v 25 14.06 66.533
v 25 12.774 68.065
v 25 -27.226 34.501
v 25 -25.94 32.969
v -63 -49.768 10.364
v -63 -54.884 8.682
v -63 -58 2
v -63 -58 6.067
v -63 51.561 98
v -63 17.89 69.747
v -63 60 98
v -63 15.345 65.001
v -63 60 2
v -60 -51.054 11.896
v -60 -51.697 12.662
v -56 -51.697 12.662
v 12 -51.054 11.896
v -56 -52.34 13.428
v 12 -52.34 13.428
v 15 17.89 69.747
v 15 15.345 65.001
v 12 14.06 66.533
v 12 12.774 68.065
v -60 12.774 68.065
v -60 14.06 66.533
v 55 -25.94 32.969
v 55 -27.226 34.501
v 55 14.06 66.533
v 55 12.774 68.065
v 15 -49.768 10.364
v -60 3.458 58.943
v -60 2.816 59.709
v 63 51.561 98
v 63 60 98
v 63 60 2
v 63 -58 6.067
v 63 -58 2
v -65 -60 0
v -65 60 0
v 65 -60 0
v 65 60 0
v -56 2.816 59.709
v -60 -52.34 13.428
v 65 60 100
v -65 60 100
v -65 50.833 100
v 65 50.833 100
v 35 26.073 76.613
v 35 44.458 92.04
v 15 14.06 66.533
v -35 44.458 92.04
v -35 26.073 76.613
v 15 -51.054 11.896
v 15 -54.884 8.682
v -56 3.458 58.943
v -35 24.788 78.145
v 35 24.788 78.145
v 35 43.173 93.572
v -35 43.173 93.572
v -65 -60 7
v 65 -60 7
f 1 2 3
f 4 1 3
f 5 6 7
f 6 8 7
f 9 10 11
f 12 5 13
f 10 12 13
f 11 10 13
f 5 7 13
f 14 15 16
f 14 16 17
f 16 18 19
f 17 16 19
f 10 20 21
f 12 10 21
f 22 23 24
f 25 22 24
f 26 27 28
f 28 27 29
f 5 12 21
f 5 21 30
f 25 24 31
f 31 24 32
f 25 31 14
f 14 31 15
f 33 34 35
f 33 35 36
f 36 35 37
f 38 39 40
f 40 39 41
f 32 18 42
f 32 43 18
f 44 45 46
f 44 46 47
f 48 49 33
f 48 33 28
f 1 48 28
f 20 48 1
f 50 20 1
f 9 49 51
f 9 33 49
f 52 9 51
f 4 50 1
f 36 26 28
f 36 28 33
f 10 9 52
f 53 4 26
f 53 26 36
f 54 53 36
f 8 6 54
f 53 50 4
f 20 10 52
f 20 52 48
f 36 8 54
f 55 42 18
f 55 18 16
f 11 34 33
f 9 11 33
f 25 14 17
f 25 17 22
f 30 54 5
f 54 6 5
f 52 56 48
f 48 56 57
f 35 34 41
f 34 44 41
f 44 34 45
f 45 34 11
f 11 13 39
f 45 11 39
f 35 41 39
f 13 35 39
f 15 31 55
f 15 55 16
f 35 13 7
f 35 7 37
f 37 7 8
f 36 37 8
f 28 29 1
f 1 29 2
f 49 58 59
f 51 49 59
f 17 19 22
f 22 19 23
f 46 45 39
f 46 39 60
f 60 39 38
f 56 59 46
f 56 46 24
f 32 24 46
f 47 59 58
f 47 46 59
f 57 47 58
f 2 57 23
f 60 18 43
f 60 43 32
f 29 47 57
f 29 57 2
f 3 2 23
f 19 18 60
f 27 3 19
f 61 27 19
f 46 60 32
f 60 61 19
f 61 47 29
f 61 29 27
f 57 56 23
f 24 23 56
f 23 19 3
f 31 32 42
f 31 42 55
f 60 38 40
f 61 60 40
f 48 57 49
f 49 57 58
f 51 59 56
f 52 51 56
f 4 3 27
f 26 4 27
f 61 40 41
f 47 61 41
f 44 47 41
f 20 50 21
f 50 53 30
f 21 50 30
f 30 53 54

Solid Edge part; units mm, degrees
sketch "Sketch1" plane through (0, 0, 0) normal (0, 0, 1) x (1, 0, 0)
  line L0 (-65, -60) -> (65, -60)
  line L1 (65, -60) -> (65, 60)
  line L2 (65, 60) -> (-65, 60)
  line L3 (-65, 60) -> (-65, -60)
extrude "Protrusion1" add sketch "Sketch1" along normal blind 2
sketch "Sketch2" plane through (0, 0, 2) normal (0, 0, 1) x (1, 0, 0)
  line L0 (-65, -60) -> (-63, -60)
  line L1 (-63, -60) -> (-63, 60)
  line L2 (-63, 60) -> (-65, 60)
  line L3 (-65, 60) -> (-65, -60)
  line L4 (65, 60) -> (63, 60)
  line L5 (63, 60) -> (63, -60)
  line L6 (63, -60) -> (65, -60)
  line L7 (65, -60) -> (65, 60)
extrude "Protrusion2" add sketch "Sketch2" along normal blind 98
sketch "Sketch3" plane through (65, 0, 51) normal (1, 0, 0) x (0, 1, 0)
  line L0 (-60, 49) -> (-60, -44)
  line L1 (50.8331, 49) -> (-60, -44)
  line L2 (50.8331, 49) -> (-60, 49)
extrude "ExtrudedCutout_1" cut sketch "Sketch3" against normal blind 130
sketch "Sketch4" plane through (-63, 0, 52) normal (1, 0, 0) x (0, 1, 0)
  line L0 (-60, -45) -> (-60, -50)
  line L1 (-60, -50) -> (-58, -50)
  line L2 (-58, -50) -> (-58, -45.9326)
  line L3 (51.561, 46) -> (-58, -45.9326)
  line L4 (60, 46) -> (51.561, 46)
  line L5 (60, 48) -> (60, 46)
  line L6 (60, 48) -> (50.8331, 48)
  line L7 (50.8331, 48) -> (-60, -45)
extrude "Protrusion3" add sketch "Sketch4" along normal up to vertex (128 mm away)
sketch "Sketch5" plane through (0, -4.5835, 53.5) normal (0, -0.6427876, 0.7660444) x (1, 0, 0)
  line L0 (35, 62.3412) -> (-35, 62.3412)
  line L1 (-35, 62.3412) -> (-35, 38.3412)
  line L2 (-35, 38.3412) -> (35, 38.3412)
  line L3 (35, 38.3412) -> (35, 62.3412)
  dimension "D1" = 10
extrude "Cutout1" cut sketch "Sketch5" against normal blind 2
sketch "Sketch6" plane through (0, -4.5835, 53.5) normal (0, -0.6427876, 0.7660444) x (1, 0, 0)
  line L0 (-60, -62.3412) -> (12, -62.3412)
  line L1 (12, -62.3412) -> (12, 22.6588)
  line L2 (12, 22.6588) -> (-60, 22.6588)
  line L3 (-60, 22.6588) -> (-60, -62.3412)
  dimension "D1" = 85
  dimension "D2" = 72
extrude "ExtrudedCutout_3" cut sketch "Sketch6" against normal blind 2
sketch "Sketch7" plane through (0, -4.5835, 53.5) normal (0, -0.6427876, 0.7660444) x (1, 0, 0)
  line L0 (25, -29.5572) -> (55, -29.5572)
  line L1 (55, -29.5572) -> (55, 22.6588)
  line L2 (55, 22.6588) -> (25, 22.6588)
  line L3 (25, 22.6588) -> (25, -29.5572)
  dimension "D1" = 52.216
  dimension "D2" = 30
  dimension "D3" = 10
extrude "Cutout2" cut sketch "Sketch7" against normal blind 2
sketch "Sketch8" plane through (-63, 1, 50) normal (1, 0, 0) x (0, 1, 0)
  line L0 (14.3454, 15.0006) -> (-50.7684, -39.6363)
  line L1 (-55.8842, -41.3182) -> (-50.7684, -39.6363)
  line L2 (-52.054, -38.1042) -> (-55.8842, -41.3182)
  line L3 (-52.054, -38.1042) -> (13.0598, 16.5327)
  line L4 (13.0598, 16.5327) -> (16.89, 19.7467)
  line L5 (16.89, 19.7467) -> (14.3454, 15.0006)
extrude "ExtrudedProtrusion_6" add sketch "Sketch8" along normal blind 78
sketch "Sketch9" plane through (-60, -19.1399, 39.9803) normal (1, 0, 0) x (0, 0.7660444, 0.6427876)
  line L0 (-42.5, 1) -> (29.5, 1)
  line L1 (29.5, 1) -> (29.5, 0)
  line L2 (29.5, 0) -> (-42.5, 0)
  line L3 (-42.5, 0) -> (-42.5, 1)
extrude "ExtrudedProtrusion_7" add sketch "Sketch9" along normal blind 4
